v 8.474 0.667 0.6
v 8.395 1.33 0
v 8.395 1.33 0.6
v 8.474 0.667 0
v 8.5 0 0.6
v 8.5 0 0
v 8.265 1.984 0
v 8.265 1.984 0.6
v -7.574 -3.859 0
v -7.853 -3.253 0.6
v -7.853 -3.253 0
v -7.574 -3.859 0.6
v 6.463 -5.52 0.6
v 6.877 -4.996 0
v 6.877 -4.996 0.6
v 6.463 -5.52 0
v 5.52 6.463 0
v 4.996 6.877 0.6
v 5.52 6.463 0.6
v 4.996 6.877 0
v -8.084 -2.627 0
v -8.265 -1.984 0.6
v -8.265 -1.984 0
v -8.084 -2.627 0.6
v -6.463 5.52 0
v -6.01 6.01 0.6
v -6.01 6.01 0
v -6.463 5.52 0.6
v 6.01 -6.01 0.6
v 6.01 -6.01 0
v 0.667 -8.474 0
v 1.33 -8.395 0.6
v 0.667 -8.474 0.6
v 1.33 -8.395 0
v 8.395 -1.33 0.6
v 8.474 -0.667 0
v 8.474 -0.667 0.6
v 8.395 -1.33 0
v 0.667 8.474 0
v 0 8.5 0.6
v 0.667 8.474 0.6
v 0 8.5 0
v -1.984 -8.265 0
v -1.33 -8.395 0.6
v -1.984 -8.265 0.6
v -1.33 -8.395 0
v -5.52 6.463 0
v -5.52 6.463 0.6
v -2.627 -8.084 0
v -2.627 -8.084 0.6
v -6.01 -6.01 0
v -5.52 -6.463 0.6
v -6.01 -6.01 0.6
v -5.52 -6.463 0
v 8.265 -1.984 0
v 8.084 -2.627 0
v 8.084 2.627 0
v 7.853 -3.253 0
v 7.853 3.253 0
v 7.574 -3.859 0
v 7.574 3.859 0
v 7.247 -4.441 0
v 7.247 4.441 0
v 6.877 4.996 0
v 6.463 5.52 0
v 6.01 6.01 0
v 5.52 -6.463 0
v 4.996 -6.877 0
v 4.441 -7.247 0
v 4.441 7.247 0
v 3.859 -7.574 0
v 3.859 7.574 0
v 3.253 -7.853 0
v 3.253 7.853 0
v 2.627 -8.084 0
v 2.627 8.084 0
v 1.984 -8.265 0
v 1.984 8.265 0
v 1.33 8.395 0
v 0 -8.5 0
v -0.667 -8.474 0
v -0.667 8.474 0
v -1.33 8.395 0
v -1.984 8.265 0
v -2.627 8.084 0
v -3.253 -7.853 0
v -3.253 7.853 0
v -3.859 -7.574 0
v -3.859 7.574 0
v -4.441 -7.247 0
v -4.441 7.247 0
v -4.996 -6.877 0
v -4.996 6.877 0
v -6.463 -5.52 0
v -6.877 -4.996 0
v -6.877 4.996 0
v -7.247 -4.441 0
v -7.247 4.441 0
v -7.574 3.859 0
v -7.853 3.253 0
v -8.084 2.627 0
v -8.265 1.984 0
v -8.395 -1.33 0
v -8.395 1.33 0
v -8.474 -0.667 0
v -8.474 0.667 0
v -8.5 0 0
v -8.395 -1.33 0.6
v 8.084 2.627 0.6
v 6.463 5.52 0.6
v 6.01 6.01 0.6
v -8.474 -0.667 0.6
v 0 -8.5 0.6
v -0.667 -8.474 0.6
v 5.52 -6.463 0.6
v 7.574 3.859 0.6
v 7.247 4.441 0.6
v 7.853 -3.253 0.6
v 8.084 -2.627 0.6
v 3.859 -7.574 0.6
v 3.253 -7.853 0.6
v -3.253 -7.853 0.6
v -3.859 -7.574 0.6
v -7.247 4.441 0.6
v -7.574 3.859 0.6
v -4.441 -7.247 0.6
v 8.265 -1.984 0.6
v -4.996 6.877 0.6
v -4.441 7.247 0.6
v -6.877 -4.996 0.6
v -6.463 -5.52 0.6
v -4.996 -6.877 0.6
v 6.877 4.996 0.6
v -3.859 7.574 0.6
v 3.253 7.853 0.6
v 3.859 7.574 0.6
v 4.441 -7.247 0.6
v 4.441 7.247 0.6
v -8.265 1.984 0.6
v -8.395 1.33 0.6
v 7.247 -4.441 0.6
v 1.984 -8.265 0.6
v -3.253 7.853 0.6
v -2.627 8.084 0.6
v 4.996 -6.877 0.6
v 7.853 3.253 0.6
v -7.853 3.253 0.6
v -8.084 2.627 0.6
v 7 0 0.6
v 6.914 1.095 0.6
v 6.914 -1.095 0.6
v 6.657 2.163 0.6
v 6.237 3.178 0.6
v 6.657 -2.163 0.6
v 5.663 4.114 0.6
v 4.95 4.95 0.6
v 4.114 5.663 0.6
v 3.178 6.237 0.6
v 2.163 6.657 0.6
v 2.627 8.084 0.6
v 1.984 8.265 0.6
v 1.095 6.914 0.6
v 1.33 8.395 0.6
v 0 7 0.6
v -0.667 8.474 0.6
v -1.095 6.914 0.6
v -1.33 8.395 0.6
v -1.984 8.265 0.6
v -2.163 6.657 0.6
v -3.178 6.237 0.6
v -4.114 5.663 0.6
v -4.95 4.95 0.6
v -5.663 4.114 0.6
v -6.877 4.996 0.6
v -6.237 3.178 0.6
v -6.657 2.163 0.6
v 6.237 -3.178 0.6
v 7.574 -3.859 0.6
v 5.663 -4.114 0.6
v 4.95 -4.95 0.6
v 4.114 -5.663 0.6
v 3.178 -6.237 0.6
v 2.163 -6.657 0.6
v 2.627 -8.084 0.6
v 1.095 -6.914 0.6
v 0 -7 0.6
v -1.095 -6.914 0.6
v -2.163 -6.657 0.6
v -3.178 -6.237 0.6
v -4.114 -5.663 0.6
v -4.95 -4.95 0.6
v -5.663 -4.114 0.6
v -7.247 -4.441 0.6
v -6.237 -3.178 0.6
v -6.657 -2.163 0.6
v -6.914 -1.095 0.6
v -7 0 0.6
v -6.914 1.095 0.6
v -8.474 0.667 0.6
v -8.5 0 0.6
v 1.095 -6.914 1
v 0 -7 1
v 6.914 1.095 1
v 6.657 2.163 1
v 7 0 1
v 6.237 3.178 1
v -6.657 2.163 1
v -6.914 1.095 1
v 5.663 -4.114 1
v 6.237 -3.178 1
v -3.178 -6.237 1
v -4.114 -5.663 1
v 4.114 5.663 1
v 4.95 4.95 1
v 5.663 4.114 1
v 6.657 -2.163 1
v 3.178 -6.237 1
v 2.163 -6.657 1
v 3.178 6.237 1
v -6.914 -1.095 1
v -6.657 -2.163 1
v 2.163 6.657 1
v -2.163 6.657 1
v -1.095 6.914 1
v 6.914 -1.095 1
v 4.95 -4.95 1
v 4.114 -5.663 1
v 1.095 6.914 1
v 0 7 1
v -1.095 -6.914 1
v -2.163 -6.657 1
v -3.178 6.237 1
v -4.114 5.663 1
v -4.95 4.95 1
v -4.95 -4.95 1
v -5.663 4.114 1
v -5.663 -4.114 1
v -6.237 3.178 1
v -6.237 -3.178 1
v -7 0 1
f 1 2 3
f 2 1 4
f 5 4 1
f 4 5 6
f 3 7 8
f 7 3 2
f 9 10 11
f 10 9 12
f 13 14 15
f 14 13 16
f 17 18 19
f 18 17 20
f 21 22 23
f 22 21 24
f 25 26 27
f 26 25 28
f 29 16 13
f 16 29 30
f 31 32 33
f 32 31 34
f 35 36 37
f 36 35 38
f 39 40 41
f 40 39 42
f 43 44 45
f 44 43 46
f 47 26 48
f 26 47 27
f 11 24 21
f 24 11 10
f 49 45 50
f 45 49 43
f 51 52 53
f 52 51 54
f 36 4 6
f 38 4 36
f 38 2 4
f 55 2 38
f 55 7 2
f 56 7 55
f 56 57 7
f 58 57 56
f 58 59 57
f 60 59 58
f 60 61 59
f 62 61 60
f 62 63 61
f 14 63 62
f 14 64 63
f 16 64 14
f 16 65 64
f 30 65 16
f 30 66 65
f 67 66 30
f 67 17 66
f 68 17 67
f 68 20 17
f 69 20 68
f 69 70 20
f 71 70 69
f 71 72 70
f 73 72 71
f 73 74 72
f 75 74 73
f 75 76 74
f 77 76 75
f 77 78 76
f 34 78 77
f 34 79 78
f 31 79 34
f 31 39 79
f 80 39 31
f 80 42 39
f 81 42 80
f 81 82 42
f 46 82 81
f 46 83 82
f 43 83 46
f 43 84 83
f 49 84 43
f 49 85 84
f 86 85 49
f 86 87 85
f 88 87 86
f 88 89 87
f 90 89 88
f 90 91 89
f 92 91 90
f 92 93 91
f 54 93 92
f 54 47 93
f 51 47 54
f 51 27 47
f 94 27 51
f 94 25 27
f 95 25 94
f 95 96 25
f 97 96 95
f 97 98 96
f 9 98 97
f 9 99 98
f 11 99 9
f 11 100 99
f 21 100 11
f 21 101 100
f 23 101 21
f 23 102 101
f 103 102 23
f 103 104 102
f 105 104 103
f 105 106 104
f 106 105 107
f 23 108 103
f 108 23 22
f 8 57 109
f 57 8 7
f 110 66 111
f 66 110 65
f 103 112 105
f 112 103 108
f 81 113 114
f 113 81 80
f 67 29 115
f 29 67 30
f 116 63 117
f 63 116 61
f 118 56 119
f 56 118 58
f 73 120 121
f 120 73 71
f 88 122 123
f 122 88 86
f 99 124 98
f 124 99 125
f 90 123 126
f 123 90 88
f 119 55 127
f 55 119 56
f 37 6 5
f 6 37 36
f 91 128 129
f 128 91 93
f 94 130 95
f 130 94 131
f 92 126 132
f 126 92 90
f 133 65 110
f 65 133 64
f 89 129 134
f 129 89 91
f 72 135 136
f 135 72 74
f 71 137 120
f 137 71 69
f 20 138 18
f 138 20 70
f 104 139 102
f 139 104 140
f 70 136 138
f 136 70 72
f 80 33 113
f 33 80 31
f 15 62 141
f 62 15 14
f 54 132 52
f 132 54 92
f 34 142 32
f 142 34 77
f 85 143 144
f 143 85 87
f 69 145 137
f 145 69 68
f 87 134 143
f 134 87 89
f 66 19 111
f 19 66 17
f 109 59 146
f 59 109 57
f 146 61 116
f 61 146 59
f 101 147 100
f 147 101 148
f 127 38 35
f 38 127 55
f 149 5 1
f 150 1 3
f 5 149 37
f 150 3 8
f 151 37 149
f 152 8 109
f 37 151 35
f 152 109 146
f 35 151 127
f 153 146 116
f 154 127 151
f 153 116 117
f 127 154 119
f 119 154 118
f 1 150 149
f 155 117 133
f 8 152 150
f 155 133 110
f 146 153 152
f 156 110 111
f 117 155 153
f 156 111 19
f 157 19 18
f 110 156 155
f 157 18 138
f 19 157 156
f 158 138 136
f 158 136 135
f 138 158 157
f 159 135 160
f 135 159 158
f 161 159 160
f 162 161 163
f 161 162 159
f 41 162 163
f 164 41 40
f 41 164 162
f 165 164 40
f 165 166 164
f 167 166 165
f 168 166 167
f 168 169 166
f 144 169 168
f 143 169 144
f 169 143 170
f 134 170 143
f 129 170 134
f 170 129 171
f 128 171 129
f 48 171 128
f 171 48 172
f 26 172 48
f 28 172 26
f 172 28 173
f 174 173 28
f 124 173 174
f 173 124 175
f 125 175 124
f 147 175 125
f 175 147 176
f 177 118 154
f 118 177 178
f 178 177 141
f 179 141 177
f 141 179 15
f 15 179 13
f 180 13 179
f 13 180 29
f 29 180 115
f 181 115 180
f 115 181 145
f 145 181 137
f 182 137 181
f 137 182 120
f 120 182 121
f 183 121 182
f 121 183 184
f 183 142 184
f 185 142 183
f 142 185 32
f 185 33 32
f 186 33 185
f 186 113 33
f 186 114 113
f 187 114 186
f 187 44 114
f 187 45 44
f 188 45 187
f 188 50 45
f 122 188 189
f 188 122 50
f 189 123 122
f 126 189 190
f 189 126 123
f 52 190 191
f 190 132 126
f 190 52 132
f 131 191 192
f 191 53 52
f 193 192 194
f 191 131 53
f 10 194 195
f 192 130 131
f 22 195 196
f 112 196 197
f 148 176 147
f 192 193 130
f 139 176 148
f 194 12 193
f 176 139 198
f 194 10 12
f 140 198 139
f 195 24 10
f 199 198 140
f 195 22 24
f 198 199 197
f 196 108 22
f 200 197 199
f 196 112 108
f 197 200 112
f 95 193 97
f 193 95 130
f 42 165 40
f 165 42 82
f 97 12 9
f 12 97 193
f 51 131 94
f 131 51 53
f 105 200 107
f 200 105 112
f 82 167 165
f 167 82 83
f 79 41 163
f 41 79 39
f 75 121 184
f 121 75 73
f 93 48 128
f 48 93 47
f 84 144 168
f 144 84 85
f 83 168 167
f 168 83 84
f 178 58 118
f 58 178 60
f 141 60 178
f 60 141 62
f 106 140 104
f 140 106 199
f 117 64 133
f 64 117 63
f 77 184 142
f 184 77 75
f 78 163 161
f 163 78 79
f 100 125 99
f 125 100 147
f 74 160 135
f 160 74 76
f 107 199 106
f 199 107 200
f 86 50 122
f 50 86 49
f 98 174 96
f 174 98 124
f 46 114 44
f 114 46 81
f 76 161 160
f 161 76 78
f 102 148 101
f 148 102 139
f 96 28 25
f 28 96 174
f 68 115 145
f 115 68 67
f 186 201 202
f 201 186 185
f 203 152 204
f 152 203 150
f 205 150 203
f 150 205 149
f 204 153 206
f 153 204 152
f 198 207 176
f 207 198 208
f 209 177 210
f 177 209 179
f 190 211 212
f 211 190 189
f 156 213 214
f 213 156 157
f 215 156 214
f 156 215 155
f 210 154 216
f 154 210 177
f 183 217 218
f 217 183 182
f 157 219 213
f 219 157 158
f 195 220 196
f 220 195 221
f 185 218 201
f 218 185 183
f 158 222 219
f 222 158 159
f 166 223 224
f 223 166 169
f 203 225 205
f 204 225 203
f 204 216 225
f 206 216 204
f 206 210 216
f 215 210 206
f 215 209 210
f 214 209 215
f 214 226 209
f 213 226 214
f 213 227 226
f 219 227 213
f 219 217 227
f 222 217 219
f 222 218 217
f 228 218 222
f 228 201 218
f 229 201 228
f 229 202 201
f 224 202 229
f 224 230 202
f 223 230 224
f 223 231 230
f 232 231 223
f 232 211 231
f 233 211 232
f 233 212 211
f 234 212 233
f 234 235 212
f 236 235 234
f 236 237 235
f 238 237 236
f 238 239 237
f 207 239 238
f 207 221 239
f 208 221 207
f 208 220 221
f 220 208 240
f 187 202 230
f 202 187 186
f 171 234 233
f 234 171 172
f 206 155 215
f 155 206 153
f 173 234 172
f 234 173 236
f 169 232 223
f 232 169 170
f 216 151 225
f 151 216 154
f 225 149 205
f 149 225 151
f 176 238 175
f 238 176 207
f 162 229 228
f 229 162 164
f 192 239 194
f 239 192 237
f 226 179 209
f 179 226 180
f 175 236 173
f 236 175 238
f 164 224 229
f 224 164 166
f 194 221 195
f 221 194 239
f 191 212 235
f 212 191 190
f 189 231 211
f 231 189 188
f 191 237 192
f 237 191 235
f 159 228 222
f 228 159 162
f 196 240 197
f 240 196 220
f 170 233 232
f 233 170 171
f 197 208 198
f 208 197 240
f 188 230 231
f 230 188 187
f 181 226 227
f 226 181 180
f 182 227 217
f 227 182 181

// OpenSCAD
module eye()
{
  cylinder(d=17, h=3*0.2, $fn=80);
  translate([0, 0, 3*0.2])
    cylinder(d=14, h=2*0.2, $fn=40);
}

eye();
